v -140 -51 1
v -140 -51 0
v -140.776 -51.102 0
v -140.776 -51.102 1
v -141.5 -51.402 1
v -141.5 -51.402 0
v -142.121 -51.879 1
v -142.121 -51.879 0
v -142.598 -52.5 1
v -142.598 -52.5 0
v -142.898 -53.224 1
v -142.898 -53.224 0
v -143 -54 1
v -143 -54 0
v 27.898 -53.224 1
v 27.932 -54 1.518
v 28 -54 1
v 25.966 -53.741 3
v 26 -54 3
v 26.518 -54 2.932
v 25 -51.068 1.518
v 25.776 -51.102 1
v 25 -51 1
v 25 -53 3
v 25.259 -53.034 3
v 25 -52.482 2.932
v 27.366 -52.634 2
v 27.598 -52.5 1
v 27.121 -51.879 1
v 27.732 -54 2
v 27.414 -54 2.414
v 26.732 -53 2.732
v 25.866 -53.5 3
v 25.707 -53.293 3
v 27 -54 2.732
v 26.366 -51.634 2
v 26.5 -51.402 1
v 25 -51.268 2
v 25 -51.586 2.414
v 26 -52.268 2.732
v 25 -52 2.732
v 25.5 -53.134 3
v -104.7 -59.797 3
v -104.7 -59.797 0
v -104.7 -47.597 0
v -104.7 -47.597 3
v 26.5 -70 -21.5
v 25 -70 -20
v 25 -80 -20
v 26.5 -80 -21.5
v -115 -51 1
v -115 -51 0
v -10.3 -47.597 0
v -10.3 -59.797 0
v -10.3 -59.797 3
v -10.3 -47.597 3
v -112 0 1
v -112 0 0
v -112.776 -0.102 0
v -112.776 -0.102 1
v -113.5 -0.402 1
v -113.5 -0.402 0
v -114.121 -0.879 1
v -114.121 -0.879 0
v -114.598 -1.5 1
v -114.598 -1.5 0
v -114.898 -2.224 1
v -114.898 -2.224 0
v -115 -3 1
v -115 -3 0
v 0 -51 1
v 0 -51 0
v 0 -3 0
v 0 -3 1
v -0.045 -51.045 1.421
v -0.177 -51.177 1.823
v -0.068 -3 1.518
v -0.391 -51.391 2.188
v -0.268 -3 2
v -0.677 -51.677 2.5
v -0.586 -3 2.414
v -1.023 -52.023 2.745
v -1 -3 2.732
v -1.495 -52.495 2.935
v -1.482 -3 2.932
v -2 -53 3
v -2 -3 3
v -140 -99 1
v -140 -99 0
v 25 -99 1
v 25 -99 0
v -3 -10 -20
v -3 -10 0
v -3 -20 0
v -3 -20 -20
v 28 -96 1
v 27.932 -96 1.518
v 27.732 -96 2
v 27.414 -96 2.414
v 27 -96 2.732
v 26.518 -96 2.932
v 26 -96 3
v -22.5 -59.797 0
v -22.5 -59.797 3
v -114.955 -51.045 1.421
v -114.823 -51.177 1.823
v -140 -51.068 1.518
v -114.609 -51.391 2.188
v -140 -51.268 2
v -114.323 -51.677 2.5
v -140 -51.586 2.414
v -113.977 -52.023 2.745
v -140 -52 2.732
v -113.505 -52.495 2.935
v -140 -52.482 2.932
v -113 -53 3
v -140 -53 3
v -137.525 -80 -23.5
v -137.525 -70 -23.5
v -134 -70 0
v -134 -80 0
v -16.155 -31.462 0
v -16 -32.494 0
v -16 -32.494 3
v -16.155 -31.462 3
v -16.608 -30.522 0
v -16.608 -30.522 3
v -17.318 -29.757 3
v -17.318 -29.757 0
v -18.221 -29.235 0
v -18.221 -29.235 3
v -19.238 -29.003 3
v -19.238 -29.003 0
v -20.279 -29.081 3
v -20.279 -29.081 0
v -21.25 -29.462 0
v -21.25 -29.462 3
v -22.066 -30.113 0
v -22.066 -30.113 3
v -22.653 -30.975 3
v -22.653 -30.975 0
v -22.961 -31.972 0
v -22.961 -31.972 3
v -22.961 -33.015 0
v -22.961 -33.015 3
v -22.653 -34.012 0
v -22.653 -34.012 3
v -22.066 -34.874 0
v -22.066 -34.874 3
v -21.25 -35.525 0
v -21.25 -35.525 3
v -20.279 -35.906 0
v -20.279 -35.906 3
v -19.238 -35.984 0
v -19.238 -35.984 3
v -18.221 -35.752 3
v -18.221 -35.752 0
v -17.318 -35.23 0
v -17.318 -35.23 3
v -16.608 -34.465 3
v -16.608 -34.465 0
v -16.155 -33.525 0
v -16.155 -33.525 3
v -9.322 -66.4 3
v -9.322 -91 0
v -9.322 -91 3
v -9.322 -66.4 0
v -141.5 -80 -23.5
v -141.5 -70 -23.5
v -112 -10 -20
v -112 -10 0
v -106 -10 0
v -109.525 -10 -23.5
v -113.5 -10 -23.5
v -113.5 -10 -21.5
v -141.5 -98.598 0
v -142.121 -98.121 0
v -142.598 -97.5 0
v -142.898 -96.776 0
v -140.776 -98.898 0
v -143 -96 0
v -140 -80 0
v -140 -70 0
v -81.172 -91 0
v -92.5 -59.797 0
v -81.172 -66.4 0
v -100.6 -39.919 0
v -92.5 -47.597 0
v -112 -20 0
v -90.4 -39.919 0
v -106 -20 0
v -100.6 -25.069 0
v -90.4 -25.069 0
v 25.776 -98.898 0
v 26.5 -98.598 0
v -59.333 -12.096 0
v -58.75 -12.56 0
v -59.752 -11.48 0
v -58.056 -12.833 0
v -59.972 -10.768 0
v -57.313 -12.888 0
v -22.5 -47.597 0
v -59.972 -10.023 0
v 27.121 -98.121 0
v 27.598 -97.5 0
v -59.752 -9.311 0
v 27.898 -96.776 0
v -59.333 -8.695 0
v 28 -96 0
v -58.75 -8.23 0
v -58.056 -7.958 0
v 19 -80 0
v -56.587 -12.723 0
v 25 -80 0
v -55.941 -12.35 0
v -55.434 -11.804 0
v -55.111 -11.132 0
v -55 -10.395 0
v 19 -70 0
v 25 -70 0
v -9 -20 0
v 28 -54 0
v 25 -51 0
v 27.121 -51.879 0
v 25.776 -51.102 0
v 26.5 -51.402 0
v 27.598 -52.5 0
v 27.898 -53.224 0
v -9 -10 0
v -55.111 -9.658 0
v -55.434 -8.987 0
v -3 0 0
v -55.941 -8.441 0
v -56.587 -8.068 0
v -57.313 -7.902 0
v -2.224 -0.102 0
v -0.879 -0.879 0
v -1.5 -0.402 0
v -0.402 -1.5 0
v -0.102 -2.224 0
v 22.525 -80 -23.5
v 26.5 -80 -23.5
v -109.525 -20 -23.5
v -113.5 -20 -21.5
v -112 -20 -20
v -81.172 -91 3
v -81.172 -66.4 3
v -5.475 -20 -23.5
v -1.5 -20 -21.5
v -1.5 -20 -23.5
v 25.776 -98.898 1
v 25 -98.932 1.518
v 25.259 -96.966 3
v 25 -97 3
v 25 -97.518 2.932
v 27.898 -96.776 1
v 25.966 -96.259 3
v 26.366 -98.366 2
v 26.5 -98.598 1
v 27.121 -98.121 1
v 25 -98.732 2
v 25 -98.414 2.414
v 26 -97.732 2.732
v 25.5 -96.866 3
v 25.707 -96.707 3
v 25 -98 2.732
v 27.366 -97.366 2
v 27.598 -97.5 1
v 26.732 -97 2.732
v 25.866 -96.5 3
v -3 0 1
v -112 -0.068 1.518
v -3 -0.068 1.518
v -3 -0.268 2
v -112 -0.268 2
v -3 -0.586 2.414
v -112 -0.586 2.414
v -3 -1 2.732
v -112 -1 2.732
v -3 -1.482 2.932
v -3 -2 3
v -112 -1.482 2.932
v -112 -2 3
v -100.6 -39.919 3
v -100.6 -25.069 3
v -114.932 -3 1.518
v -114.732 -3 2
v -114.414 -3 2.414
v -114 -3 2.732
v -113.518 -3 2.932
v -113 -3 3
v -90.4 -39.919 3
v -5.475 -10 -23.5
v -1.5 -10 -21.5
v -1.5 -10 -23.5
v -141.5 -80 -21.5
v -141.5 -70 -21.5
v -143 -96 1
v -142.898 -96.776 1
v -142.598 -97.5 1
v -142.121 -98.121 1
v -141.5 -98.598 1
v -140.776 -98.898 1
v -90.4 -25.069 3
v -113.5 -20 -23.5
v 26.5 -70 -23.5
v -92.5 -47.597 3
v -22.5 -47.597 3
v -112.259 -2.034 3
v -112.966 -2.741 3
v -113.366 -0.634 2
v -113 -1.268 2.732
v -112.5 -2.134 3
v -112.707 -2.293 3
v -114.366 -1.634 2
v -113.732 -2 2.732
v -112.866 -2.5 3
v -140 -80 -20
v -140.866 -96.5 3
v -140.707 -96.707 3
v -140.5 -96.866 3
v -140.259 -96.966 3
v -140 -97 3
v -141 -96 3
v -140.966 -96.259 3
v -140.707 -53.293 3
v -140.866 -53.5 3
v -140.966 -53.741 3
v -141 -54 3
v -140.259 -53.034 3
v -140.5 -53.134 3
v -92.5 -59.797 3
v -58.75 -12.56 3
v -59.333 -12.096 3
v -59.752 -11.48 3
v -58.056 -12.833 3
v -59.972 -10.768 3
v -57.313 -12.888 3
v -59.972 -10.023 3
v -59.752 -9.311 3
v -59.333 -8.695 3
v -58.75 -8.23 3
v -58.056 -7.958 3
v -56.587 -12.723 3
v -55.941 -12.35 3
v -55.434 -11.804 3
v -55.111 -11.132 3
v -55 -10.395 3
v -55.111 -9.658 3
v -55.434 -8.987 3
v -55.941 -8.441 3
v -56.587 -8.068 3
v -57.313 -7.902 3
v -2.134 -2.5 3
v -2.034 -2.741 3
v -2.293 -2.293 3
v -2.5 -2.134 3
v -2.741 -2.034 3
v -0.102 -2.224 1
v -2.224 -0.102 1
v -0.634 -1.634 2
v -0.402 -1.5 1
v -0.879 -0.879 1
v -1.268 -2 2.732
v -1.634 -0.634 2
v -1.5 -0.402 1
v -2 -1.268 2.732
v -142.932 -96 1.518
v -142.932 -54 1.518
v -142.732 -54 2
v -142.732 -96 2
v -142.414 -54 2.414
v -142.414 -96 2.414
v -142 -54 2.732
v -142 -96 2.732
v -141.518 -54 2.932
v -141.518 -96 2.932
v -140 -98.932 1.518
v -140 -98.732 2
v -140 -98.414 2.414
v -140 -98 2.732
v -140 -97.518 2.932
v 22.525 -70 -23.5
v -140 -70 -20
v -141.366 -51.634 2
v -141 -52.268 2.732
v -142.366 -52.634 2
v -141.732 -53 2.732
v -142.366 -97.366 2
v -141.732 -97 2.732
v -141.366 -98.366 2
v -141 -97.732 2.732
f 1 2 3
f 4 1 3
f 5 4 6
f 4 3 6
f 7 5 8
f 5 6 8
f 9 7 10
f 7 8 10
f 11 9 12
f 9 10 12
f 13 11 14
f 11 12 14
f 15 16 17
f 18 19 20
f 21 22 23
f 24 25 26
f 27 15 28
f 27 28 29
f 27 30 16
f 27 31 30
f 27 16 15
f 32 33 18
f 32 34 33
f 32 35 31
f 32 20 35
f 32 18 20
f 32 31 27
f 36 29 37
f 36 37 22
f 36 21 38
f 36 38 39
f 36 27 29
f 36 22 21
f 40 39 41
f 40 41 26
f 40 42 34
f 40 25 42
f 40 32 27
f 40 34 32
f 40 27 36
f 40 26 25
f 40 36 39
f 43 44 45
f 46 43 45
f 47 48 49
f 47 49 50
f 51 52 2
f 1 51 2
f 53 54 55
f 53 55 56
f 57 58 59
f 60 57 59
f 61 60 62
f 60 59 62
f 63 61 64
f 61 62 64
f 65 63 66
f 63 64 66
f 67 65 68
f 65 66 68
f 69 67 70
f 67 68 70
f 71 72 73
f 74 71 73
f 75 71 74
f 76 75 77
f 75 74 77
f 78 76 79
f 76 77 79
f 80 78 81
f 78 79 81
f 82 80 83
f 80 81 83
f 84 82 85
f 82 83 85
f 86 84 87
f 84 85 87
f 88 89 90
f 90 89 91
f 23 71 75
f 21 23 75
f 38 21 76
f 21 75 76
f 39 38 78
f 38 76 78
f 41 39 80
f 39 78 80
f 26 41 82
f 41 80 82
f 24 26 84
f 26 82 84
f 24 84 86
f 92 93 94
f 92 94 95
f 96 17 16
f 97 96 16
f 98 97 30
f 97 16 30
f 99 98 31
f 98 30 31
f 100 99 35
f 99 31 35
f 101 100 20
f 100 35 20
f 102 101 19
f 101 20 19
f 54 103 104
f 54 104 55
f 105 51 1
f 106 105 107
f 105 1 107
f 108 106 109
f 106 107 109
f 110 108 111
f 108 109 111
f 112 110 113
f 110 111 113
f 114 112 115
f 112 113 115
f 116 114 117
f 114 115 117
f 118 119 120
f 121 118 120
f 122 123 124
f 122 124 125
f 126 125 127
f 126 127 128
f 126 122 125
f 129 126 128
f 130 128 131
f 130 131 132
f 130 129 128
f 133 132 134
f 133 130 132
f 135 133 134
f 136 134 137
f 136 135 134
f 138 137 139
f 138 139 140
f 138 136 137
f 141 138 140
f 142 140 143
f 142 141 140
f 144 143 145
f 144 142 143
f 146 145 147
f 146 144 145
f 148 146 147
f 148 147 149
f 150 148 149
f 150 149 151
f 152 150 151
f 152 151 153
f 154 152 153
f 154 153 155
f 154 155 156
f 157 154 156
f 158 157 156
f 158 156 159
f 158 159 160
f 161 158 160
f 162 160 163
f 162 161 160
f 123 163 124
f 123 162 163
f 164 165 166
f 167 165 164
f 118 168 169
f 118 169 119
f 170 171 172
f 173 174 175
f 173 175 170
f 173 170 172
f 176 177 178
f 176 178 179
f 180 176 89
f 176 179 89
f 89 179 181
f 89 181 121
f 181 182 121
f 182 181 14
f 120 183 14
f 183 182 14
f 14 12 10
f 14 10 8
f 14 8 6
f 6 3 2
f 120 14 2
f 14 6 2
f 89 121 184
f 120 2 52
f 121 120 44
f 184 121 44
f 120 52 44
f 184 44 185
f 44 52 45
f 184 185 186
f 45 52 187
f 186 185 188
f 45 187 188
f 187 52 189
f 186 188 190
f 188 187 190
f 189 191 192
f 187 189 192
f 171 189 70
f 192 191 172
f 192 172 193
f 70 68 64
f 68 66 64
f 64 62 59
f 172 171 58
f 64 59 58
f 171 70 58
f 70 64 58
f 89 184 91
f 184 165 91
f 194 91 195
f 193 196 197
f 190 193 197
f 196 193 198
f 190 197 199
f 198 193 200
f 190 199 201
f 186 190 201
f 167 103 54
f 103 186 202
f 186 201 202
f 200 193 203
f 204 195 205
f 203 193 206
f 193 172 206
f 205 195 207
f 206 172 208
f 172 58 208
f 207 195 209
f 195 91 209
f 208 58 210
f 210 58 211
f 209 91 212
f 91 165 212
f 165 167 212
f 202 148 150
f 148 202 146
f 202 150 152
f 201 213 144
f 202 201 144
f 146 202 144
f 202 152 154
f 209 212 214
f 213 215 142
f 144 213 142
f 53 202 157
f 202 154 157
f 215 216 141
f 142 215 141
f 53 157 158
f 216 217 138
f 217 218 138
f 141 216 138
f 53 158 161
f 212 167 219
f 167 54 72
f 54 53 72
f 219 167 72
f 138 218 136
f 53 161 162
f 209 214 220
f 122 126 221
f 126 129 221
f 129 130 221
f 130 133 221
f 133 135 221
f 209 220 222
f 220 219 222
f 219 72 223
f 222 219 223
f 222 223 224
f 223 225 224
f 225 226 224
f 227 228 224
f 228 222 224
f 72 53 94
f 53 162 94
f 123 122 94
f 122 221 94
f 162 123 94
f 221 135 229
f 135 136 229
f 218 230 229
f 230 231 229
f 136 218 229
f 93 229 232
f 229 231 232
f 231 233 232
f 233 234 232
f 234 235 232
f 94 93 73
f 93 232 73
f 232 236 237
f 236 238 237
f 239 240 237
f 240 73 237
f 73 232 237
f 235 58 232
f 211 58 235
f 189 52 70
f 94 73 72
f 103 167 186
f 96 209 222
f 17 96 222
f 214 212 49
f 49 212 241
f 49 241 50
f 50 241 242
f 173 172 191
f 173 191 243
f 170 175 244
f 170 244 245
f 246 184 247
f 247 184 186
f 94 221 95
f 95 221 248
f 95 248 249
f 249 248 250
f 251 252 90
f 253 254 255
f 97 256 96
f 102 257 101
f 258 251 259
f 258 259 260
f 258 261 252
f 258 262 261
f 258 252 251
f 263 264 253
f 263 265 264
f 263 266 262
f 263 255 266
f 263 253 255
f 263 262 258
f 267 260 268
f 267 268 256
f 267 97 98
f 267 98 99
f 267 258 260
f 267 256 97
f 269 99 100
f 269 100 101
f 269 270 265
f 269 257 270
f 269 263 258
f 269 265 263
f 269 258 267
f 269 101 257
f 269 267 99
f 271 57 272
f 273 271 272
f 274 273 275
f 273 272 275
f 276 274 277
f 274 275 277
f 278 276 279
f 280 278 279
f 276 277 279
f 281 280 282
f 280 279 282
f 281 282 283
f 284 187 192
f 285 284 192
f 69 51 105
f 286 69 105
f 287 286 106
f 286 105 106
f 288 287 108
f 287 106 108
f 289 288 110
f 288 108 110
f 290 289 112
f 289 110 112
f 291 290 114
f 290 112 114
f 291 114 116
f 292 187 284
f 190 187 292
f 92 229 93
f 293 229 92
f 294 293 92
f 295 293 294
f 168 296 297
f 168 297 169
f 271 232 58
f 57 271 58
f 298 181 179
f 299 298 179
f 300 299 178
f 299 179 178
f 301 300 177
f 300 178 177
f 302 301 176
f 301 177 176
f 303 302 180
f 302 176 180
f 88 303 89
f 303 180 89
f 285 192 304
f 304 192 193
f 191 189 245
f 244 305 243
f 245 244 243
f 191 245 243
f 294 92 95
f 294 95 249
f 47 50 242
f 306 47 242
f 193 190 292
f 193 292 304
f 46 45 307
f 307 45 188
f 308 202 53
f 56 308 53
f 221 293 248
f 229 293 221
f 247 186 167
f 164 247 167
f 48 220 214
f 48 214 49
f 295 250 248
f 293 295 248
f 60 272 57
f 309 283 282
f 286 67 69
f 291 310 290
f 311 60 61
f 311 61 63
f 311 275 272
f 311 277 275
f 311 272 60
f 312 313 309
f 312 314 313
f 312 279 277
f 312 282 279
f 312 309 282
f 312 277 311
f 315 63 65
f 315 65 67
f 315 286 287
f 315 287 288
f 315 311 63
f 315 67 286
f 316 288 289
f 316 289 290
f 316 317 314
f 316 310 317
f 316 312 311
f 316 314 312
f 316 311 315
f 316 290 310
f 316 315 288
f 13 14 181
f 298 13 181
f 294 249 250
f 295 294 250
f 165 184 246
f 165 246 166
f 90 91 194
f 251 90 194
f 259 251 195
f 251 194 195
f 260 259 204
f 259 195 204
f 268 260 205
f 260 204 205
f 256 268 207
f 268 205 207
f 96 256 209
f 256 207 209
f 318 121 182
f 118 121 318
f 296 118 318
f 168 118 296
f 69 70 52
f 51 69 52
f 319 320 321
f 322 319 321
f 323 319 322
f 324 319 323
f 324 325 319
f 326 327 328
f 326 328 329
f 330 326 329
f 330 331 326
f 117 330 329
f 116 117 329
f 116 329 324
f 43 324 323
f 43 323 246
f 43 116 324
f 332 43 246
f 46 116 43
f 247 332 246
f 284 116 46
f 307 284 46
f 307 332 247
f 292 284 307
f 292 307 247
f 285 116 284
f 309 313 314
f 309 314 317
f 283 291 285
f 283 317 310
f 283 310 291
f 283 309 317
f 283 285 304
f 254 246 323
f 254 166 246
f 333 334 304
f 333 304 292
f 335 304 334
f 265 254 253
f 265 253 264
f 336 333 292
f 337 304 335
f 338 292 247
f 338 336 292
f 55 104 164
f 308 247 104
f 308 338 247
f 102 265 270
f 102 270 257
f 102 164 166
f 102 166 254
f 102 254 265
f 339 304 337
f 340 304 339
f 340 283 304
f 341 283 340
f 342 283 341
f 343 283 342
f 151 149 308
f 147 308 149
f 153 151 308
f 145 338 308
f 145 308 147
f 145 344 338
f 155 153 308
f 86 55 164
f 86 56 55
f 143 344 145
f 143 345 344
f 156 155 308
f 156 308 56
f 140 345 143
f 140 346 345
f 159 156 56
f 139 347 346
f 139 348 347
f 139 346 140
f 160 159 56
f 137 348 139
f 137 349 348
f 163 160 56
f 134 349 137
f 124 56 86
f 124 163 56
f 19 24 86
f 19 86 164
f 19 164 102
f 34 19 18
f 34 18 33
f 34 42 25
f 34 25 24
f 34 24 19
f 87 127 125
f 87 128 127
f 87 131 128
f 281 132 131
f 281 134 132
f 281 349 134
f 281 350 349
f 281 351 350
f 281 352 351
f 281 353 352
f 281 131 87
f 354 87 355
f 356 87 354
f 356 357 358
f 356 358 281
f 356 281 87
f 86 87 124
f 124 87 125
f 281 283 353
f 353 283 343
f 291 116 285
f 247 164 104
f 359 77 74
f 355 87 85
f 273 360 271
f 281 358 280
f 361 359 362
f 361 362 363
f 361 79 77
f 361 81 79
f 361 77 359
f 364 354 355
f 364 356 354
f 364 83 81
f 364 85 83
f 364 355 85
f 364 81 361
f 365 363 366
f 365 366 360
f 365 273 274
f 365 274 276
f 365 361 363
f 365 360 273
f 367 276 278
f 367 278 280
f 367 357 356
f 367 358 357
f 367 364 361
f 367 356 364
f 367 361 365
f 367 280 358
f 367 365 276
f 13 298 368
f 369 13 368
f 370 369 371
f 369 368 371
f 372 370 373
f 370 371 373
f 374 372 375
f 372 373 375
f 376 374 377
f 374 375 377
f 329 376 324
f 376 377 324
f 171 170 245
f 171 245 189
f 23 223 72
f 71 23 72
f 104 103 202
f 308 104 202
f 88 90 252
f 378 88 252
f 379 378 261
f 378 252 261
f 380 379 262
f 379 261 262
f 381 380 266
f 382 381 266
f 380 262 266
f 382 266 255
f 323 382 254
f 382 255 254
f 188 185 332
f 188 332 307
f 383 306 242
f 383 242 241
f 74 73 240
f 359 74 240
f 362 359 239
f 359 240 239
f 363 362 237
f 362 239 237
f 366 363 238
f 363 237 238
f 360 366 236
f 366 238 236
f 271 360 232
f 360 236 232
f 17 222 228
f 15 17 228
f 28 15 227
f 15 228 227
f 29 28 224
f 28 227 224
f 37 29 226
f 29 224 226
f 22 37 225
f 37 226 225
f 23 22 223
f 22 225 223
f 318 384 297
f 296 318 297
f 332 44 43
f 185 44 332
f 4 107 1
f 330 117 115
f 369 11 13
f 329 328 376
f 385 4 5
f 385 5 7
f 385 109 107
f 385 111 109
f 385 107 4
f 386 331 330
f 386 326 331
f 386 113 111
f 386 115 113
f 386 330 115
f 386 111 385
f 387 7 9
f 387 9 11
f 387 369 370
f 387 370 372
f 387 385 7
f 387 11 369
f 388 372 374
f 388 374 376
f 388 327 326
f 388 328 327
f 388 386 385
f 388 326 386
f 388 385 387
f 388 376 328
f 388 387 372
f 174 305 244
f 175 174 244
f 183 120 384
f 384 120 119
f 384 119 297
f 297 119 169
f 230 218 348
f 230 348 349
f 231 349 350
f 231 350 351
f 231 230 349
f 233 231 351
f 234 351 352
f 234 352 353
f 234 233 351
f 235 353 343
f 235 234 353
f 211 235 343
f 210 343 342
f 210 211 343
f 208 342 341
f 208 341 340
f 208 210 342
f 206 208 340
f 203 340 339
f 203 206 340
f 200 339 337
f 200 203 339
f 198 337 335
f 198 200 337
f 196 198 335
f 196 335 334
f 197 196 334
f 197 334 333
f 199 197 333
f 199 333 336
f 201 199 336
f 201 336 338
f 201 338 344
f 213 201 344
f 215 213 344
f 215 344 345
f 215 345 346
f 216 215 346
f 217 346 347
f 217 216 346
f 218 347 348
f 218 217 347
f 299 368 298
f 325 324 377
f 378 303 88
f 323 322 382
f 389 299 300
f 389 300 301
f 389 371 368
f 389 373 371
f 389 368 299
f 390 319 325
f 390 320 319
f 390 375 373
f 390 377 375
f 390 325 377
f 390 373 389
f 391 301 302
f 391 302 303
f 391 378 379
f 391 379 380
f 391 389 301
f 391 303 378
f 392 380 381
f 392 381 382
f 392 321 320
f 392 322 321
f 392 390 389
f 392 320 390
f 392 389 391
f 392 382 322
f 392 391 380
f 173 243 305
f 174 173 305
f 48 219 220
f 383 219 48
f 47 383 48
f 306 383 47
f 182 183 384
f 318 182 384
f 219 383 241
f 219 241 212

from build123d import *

# Parameters (mm, degrees)
SKETCH1_R           = 2.5
SKETCH1_R_2         = 3.5
SKETCH1_W           = 71.85
SKETCH1_H           = 24.6
SKETCH1_W_2         = 12.2
SKETCH1_H_2         = 12.2
SKETCH1_W_3         = 10.2
SKETCH1_H_3         = 14.85
BOSS_EXTRUDE1_DEPTH = 3
FILLET1_R           = 2
FILLET2_R           = 3
BOSS_EXTRUDE2_START = -10
BOSS_EXTRUDE2_DEPTH = 10
BOSS_EXTRUDE3_START = -10
BOSS_EXTRUDE3_DEPTH = 10


with BuildPart() as part:
    # Sketch1 → Boss-Extrude1 (new body)
    with BuildSketch(Plane.XY):
        Polygon((0, 0), (-115, 0), (-115, -51), (-143, -51), (-143, -99), (-115, -99), (0, -99), (28, -99), (28, -51), (0, -51), align=None)
        with Locations((-57.5, -10.395373235)):
            Circle(SKETCH1_R, mode=Mode.SUBTRACT)
        with Locations((-19.5, -32.493549158)):
            Circle(SKETCH1_R_2, mode=Mode.SUBTRACT)
        with Locations((-45.247302804, -78.7)):
            Rectangle(SKETCH1_W, SKETCH1_H, mode=Mode.SUBTRACT)
        with Locations((-98.6, -53.697377152)):
            Rectangle(SKETCH1_W_2, SKETCH1_H_2, mode=Mode.SUBTRACT)
        with Locations((-95.5, -32.493549158)):
            Rectangle(SKETCH1_W_3, SKETCH1_H_3, mode=Mode.SUBTRACT)
        with Locations((-16.4, -53.697377152)):
            Rectangle(SKETCH1_W_2, SKETCH1_H_2, mode=Mode.SUBTRACT)
    extrude(amount=BOSS_EXTRUDE1_DEPTH)

    # Fillet1
    fillet1_edges = [part.edges().sort_by_distance(p)[0] for p in [
        (-115, -25.5, 3),
        (-129, -51, 3),
        (-143, -75, 3),
        (-57.5, -99, 3),
        (28, -75, 3),
        (14, -51, 3),
        (0, -25.5, 3),
        (-57.5, 0, 3),
    ]]
    fillet(fillet1_edges, radius=FILLET1_R)

    # Fillet2
    # the kernel refuses this fillet: 3 mm, written as the material it takes off along each edge
    with BuildSketch(Plane(origin=(-140, -54, 3), x_dir=(0, 1, 0), z_dir=(1, 0, 0))) as fillet2_piece_1:
        with BuildLine():
            CenterArc((1, -2), 2, 0, 90)
            Line((3, -2), (3, 0))
            Line((3, 0), (1, 0))
        make_face()
    revolve(axis=Axis((-140, -54, 3), (0, 0, 1)), revolution_arc=90, mode=Mode.SUBTRACT)
    with BuildSketch(Plane(origin=(-140, -96, 3), x_dir=(-1, 0, 0), z_dir=(0, 1, 0))) as fillet2_piece_2:
        with BuildLine():
            CenterArc((1, -2), 2, 0, 90)
            Line((3, -2), (3, 0))
            Line((3, 0), (1, 0))
        make_face()
    revolve(axis=Axis((-140, -96, 3), (0, 0, 1)), revolution_arc=90, mode=Mode.SUBTRACT)
    with BuildSketch(Plane(origin=(-112, -3, 3), x_dir=(0, 1, 0), z_dir=(1, 0, 0))) as fillet2_piece_3:
        with BuildLine():
            CenterArc((1, -2), 2, 0, 90)
            Line((3, -2), (3, 0))
            Line((3, 0), (1, 0))
        make_face()
    revolve(axis=Axis((-112, -3, 3), (0, 0, 1)), revolution_arc=90, mode=Mode.SUBTRACT)
    with BuildSketch(Plane(origin=(25, -96, 3), x_dir=(0, -1, 0), z_dir=(-1, 0, 0))) as fillet2_piece_4:
        with BuildLine():
            CenterArc((1, -2), 2, 0, 90)
            Line((3, -2), (3, 0))
            Line((3, 0), (1, 0))
        make_face()
    revolve(axis=Axis((25, -96, 3), (0, 0, 1)), revolution_arc=90, mode=Mode.SUBTRACT)
    with BuildSketch(Plane(origin=(-3, -3, 3), x_dir=(1, 0, 0), z_dir=(0, -1, 0))) as fillet2_piece_5:
        with BuildLine():
            CenterArc((1, -2), 2, 0, 90)
            Line((3, -2), (3, 0))
            Line((3, 0), (1, 0))
        make_face()
    revolve(axis=Axis((-3, -3, 3), (0, 0, 1)), revolution_arc=90, mode=Mode.SUBTRACT)
    with BuildSketch(Plane(origin=(25, -54, 3), x_dir=(1, 0, 0), z_dir=(0, -1, 0))) as fillet2_piece_6:
        with BuildLine():
            CenterArc((1, -2), 2, 0, 90)
            Line((3, -2), (3, 0))
            Line((3, 0), (1, 0))
        make_face()
    revolve(axis=Axis((25, -54, 3), (0, 0, 1)), revolution_arc=90, mode=Mode.SUBTRACT)
    with BuildSketch(Plane(origin=(28, -51, -7.5), x_dir=(-1, 0, 0), z_dir=(0, 0, 1)), Plane(origin=(0, 0, -7.5), x_dir=(-1, 0, 0), z_dir=(0, 0, 1))) as fillet2_piece_7:
        with BuildLine():
            CenterArc((FILLET2_R, FILLET2_R), FILLET2_R, 180, 90)
            Line((0, FILLET2_R), (0, 0))
            Line((0, 0), (FILLET2_R, 0))
        make_face()
    extrude(amount=10.5, mode=Mode.SUBTRACT)
    with BuildSketch(Plane(origin=(-115, 0, -7.5), x_dir=(1, 0, 0), z_dir=(0, 0, 1)), Plane(origin=(-143, -51, -7.5), x_dir=(1, 0, 0), z_dir=(0, 0, 1)), Plane(origin=(28, -99, -7.5), x_dir=(-1, 0, 0), z_dir=(0, 0, 1)), Plane(origin=(-143, -99, -7.5), x_dir=(0, 1, 0), z_dir=(0, 0, 1))) as fillet2_piece_8:
        with BuildLine():
            CenterArc((FILLET2_R, -FILLET2_R), FILLET2_R, 90, 90)
            Line((0, -FILLET2_R), (0, 0))
            Line((0, 0), (FILLET2_R, 0))
        make_face()
    extrude(amount=10.5, mode=Mode.SUBTRACT)

    # Sketch3 → Boss-Extrude2 (add)
    with BuildSketch(Plane(origin=(0, -60, 0), x_dir=(1, 0, 0), z_dir=(0, 1, 0)).offset(BOSS_EXTRUDE2_START)):
        Polygon((25, 0), (25, 20), (26.5, 21.5), (26.5, 23.5), (22.525, 23.5), (19, 0), align=None)
        Polygon((-134, 0), (-140, 0), (-140, 20), (-141.5, 21.5), (-141.5, 23.5), (-137.525, 23.5), align=None)
    extrude(amount=-BOSS_EXTRUDE2_DEPTH)

    # Sketch4 → Boss-Extrude3 (add)
    with BuildSketch(Plane(origin=(0, 0, 0), x_dir=(1, 0, 0), z_dir=(0, 1, 0)).offset(BOSS_EXTRUDE3_START)):
        Polygon((-112, 0), (-106, 0), (-109.525, 23.5), (-113.5, 23.5), (-113.5, 21.5), (-112, 20), align=None)
        Polygon((-1.5, 21.5), (-1.5, 23.5), (-5.475, 23.5), (-9, 0), (-3, 0), (-3, 20), align=None)
    extrude(amount=-BOSS_EXTRUDE3_DEPTH)


solid = part.part
